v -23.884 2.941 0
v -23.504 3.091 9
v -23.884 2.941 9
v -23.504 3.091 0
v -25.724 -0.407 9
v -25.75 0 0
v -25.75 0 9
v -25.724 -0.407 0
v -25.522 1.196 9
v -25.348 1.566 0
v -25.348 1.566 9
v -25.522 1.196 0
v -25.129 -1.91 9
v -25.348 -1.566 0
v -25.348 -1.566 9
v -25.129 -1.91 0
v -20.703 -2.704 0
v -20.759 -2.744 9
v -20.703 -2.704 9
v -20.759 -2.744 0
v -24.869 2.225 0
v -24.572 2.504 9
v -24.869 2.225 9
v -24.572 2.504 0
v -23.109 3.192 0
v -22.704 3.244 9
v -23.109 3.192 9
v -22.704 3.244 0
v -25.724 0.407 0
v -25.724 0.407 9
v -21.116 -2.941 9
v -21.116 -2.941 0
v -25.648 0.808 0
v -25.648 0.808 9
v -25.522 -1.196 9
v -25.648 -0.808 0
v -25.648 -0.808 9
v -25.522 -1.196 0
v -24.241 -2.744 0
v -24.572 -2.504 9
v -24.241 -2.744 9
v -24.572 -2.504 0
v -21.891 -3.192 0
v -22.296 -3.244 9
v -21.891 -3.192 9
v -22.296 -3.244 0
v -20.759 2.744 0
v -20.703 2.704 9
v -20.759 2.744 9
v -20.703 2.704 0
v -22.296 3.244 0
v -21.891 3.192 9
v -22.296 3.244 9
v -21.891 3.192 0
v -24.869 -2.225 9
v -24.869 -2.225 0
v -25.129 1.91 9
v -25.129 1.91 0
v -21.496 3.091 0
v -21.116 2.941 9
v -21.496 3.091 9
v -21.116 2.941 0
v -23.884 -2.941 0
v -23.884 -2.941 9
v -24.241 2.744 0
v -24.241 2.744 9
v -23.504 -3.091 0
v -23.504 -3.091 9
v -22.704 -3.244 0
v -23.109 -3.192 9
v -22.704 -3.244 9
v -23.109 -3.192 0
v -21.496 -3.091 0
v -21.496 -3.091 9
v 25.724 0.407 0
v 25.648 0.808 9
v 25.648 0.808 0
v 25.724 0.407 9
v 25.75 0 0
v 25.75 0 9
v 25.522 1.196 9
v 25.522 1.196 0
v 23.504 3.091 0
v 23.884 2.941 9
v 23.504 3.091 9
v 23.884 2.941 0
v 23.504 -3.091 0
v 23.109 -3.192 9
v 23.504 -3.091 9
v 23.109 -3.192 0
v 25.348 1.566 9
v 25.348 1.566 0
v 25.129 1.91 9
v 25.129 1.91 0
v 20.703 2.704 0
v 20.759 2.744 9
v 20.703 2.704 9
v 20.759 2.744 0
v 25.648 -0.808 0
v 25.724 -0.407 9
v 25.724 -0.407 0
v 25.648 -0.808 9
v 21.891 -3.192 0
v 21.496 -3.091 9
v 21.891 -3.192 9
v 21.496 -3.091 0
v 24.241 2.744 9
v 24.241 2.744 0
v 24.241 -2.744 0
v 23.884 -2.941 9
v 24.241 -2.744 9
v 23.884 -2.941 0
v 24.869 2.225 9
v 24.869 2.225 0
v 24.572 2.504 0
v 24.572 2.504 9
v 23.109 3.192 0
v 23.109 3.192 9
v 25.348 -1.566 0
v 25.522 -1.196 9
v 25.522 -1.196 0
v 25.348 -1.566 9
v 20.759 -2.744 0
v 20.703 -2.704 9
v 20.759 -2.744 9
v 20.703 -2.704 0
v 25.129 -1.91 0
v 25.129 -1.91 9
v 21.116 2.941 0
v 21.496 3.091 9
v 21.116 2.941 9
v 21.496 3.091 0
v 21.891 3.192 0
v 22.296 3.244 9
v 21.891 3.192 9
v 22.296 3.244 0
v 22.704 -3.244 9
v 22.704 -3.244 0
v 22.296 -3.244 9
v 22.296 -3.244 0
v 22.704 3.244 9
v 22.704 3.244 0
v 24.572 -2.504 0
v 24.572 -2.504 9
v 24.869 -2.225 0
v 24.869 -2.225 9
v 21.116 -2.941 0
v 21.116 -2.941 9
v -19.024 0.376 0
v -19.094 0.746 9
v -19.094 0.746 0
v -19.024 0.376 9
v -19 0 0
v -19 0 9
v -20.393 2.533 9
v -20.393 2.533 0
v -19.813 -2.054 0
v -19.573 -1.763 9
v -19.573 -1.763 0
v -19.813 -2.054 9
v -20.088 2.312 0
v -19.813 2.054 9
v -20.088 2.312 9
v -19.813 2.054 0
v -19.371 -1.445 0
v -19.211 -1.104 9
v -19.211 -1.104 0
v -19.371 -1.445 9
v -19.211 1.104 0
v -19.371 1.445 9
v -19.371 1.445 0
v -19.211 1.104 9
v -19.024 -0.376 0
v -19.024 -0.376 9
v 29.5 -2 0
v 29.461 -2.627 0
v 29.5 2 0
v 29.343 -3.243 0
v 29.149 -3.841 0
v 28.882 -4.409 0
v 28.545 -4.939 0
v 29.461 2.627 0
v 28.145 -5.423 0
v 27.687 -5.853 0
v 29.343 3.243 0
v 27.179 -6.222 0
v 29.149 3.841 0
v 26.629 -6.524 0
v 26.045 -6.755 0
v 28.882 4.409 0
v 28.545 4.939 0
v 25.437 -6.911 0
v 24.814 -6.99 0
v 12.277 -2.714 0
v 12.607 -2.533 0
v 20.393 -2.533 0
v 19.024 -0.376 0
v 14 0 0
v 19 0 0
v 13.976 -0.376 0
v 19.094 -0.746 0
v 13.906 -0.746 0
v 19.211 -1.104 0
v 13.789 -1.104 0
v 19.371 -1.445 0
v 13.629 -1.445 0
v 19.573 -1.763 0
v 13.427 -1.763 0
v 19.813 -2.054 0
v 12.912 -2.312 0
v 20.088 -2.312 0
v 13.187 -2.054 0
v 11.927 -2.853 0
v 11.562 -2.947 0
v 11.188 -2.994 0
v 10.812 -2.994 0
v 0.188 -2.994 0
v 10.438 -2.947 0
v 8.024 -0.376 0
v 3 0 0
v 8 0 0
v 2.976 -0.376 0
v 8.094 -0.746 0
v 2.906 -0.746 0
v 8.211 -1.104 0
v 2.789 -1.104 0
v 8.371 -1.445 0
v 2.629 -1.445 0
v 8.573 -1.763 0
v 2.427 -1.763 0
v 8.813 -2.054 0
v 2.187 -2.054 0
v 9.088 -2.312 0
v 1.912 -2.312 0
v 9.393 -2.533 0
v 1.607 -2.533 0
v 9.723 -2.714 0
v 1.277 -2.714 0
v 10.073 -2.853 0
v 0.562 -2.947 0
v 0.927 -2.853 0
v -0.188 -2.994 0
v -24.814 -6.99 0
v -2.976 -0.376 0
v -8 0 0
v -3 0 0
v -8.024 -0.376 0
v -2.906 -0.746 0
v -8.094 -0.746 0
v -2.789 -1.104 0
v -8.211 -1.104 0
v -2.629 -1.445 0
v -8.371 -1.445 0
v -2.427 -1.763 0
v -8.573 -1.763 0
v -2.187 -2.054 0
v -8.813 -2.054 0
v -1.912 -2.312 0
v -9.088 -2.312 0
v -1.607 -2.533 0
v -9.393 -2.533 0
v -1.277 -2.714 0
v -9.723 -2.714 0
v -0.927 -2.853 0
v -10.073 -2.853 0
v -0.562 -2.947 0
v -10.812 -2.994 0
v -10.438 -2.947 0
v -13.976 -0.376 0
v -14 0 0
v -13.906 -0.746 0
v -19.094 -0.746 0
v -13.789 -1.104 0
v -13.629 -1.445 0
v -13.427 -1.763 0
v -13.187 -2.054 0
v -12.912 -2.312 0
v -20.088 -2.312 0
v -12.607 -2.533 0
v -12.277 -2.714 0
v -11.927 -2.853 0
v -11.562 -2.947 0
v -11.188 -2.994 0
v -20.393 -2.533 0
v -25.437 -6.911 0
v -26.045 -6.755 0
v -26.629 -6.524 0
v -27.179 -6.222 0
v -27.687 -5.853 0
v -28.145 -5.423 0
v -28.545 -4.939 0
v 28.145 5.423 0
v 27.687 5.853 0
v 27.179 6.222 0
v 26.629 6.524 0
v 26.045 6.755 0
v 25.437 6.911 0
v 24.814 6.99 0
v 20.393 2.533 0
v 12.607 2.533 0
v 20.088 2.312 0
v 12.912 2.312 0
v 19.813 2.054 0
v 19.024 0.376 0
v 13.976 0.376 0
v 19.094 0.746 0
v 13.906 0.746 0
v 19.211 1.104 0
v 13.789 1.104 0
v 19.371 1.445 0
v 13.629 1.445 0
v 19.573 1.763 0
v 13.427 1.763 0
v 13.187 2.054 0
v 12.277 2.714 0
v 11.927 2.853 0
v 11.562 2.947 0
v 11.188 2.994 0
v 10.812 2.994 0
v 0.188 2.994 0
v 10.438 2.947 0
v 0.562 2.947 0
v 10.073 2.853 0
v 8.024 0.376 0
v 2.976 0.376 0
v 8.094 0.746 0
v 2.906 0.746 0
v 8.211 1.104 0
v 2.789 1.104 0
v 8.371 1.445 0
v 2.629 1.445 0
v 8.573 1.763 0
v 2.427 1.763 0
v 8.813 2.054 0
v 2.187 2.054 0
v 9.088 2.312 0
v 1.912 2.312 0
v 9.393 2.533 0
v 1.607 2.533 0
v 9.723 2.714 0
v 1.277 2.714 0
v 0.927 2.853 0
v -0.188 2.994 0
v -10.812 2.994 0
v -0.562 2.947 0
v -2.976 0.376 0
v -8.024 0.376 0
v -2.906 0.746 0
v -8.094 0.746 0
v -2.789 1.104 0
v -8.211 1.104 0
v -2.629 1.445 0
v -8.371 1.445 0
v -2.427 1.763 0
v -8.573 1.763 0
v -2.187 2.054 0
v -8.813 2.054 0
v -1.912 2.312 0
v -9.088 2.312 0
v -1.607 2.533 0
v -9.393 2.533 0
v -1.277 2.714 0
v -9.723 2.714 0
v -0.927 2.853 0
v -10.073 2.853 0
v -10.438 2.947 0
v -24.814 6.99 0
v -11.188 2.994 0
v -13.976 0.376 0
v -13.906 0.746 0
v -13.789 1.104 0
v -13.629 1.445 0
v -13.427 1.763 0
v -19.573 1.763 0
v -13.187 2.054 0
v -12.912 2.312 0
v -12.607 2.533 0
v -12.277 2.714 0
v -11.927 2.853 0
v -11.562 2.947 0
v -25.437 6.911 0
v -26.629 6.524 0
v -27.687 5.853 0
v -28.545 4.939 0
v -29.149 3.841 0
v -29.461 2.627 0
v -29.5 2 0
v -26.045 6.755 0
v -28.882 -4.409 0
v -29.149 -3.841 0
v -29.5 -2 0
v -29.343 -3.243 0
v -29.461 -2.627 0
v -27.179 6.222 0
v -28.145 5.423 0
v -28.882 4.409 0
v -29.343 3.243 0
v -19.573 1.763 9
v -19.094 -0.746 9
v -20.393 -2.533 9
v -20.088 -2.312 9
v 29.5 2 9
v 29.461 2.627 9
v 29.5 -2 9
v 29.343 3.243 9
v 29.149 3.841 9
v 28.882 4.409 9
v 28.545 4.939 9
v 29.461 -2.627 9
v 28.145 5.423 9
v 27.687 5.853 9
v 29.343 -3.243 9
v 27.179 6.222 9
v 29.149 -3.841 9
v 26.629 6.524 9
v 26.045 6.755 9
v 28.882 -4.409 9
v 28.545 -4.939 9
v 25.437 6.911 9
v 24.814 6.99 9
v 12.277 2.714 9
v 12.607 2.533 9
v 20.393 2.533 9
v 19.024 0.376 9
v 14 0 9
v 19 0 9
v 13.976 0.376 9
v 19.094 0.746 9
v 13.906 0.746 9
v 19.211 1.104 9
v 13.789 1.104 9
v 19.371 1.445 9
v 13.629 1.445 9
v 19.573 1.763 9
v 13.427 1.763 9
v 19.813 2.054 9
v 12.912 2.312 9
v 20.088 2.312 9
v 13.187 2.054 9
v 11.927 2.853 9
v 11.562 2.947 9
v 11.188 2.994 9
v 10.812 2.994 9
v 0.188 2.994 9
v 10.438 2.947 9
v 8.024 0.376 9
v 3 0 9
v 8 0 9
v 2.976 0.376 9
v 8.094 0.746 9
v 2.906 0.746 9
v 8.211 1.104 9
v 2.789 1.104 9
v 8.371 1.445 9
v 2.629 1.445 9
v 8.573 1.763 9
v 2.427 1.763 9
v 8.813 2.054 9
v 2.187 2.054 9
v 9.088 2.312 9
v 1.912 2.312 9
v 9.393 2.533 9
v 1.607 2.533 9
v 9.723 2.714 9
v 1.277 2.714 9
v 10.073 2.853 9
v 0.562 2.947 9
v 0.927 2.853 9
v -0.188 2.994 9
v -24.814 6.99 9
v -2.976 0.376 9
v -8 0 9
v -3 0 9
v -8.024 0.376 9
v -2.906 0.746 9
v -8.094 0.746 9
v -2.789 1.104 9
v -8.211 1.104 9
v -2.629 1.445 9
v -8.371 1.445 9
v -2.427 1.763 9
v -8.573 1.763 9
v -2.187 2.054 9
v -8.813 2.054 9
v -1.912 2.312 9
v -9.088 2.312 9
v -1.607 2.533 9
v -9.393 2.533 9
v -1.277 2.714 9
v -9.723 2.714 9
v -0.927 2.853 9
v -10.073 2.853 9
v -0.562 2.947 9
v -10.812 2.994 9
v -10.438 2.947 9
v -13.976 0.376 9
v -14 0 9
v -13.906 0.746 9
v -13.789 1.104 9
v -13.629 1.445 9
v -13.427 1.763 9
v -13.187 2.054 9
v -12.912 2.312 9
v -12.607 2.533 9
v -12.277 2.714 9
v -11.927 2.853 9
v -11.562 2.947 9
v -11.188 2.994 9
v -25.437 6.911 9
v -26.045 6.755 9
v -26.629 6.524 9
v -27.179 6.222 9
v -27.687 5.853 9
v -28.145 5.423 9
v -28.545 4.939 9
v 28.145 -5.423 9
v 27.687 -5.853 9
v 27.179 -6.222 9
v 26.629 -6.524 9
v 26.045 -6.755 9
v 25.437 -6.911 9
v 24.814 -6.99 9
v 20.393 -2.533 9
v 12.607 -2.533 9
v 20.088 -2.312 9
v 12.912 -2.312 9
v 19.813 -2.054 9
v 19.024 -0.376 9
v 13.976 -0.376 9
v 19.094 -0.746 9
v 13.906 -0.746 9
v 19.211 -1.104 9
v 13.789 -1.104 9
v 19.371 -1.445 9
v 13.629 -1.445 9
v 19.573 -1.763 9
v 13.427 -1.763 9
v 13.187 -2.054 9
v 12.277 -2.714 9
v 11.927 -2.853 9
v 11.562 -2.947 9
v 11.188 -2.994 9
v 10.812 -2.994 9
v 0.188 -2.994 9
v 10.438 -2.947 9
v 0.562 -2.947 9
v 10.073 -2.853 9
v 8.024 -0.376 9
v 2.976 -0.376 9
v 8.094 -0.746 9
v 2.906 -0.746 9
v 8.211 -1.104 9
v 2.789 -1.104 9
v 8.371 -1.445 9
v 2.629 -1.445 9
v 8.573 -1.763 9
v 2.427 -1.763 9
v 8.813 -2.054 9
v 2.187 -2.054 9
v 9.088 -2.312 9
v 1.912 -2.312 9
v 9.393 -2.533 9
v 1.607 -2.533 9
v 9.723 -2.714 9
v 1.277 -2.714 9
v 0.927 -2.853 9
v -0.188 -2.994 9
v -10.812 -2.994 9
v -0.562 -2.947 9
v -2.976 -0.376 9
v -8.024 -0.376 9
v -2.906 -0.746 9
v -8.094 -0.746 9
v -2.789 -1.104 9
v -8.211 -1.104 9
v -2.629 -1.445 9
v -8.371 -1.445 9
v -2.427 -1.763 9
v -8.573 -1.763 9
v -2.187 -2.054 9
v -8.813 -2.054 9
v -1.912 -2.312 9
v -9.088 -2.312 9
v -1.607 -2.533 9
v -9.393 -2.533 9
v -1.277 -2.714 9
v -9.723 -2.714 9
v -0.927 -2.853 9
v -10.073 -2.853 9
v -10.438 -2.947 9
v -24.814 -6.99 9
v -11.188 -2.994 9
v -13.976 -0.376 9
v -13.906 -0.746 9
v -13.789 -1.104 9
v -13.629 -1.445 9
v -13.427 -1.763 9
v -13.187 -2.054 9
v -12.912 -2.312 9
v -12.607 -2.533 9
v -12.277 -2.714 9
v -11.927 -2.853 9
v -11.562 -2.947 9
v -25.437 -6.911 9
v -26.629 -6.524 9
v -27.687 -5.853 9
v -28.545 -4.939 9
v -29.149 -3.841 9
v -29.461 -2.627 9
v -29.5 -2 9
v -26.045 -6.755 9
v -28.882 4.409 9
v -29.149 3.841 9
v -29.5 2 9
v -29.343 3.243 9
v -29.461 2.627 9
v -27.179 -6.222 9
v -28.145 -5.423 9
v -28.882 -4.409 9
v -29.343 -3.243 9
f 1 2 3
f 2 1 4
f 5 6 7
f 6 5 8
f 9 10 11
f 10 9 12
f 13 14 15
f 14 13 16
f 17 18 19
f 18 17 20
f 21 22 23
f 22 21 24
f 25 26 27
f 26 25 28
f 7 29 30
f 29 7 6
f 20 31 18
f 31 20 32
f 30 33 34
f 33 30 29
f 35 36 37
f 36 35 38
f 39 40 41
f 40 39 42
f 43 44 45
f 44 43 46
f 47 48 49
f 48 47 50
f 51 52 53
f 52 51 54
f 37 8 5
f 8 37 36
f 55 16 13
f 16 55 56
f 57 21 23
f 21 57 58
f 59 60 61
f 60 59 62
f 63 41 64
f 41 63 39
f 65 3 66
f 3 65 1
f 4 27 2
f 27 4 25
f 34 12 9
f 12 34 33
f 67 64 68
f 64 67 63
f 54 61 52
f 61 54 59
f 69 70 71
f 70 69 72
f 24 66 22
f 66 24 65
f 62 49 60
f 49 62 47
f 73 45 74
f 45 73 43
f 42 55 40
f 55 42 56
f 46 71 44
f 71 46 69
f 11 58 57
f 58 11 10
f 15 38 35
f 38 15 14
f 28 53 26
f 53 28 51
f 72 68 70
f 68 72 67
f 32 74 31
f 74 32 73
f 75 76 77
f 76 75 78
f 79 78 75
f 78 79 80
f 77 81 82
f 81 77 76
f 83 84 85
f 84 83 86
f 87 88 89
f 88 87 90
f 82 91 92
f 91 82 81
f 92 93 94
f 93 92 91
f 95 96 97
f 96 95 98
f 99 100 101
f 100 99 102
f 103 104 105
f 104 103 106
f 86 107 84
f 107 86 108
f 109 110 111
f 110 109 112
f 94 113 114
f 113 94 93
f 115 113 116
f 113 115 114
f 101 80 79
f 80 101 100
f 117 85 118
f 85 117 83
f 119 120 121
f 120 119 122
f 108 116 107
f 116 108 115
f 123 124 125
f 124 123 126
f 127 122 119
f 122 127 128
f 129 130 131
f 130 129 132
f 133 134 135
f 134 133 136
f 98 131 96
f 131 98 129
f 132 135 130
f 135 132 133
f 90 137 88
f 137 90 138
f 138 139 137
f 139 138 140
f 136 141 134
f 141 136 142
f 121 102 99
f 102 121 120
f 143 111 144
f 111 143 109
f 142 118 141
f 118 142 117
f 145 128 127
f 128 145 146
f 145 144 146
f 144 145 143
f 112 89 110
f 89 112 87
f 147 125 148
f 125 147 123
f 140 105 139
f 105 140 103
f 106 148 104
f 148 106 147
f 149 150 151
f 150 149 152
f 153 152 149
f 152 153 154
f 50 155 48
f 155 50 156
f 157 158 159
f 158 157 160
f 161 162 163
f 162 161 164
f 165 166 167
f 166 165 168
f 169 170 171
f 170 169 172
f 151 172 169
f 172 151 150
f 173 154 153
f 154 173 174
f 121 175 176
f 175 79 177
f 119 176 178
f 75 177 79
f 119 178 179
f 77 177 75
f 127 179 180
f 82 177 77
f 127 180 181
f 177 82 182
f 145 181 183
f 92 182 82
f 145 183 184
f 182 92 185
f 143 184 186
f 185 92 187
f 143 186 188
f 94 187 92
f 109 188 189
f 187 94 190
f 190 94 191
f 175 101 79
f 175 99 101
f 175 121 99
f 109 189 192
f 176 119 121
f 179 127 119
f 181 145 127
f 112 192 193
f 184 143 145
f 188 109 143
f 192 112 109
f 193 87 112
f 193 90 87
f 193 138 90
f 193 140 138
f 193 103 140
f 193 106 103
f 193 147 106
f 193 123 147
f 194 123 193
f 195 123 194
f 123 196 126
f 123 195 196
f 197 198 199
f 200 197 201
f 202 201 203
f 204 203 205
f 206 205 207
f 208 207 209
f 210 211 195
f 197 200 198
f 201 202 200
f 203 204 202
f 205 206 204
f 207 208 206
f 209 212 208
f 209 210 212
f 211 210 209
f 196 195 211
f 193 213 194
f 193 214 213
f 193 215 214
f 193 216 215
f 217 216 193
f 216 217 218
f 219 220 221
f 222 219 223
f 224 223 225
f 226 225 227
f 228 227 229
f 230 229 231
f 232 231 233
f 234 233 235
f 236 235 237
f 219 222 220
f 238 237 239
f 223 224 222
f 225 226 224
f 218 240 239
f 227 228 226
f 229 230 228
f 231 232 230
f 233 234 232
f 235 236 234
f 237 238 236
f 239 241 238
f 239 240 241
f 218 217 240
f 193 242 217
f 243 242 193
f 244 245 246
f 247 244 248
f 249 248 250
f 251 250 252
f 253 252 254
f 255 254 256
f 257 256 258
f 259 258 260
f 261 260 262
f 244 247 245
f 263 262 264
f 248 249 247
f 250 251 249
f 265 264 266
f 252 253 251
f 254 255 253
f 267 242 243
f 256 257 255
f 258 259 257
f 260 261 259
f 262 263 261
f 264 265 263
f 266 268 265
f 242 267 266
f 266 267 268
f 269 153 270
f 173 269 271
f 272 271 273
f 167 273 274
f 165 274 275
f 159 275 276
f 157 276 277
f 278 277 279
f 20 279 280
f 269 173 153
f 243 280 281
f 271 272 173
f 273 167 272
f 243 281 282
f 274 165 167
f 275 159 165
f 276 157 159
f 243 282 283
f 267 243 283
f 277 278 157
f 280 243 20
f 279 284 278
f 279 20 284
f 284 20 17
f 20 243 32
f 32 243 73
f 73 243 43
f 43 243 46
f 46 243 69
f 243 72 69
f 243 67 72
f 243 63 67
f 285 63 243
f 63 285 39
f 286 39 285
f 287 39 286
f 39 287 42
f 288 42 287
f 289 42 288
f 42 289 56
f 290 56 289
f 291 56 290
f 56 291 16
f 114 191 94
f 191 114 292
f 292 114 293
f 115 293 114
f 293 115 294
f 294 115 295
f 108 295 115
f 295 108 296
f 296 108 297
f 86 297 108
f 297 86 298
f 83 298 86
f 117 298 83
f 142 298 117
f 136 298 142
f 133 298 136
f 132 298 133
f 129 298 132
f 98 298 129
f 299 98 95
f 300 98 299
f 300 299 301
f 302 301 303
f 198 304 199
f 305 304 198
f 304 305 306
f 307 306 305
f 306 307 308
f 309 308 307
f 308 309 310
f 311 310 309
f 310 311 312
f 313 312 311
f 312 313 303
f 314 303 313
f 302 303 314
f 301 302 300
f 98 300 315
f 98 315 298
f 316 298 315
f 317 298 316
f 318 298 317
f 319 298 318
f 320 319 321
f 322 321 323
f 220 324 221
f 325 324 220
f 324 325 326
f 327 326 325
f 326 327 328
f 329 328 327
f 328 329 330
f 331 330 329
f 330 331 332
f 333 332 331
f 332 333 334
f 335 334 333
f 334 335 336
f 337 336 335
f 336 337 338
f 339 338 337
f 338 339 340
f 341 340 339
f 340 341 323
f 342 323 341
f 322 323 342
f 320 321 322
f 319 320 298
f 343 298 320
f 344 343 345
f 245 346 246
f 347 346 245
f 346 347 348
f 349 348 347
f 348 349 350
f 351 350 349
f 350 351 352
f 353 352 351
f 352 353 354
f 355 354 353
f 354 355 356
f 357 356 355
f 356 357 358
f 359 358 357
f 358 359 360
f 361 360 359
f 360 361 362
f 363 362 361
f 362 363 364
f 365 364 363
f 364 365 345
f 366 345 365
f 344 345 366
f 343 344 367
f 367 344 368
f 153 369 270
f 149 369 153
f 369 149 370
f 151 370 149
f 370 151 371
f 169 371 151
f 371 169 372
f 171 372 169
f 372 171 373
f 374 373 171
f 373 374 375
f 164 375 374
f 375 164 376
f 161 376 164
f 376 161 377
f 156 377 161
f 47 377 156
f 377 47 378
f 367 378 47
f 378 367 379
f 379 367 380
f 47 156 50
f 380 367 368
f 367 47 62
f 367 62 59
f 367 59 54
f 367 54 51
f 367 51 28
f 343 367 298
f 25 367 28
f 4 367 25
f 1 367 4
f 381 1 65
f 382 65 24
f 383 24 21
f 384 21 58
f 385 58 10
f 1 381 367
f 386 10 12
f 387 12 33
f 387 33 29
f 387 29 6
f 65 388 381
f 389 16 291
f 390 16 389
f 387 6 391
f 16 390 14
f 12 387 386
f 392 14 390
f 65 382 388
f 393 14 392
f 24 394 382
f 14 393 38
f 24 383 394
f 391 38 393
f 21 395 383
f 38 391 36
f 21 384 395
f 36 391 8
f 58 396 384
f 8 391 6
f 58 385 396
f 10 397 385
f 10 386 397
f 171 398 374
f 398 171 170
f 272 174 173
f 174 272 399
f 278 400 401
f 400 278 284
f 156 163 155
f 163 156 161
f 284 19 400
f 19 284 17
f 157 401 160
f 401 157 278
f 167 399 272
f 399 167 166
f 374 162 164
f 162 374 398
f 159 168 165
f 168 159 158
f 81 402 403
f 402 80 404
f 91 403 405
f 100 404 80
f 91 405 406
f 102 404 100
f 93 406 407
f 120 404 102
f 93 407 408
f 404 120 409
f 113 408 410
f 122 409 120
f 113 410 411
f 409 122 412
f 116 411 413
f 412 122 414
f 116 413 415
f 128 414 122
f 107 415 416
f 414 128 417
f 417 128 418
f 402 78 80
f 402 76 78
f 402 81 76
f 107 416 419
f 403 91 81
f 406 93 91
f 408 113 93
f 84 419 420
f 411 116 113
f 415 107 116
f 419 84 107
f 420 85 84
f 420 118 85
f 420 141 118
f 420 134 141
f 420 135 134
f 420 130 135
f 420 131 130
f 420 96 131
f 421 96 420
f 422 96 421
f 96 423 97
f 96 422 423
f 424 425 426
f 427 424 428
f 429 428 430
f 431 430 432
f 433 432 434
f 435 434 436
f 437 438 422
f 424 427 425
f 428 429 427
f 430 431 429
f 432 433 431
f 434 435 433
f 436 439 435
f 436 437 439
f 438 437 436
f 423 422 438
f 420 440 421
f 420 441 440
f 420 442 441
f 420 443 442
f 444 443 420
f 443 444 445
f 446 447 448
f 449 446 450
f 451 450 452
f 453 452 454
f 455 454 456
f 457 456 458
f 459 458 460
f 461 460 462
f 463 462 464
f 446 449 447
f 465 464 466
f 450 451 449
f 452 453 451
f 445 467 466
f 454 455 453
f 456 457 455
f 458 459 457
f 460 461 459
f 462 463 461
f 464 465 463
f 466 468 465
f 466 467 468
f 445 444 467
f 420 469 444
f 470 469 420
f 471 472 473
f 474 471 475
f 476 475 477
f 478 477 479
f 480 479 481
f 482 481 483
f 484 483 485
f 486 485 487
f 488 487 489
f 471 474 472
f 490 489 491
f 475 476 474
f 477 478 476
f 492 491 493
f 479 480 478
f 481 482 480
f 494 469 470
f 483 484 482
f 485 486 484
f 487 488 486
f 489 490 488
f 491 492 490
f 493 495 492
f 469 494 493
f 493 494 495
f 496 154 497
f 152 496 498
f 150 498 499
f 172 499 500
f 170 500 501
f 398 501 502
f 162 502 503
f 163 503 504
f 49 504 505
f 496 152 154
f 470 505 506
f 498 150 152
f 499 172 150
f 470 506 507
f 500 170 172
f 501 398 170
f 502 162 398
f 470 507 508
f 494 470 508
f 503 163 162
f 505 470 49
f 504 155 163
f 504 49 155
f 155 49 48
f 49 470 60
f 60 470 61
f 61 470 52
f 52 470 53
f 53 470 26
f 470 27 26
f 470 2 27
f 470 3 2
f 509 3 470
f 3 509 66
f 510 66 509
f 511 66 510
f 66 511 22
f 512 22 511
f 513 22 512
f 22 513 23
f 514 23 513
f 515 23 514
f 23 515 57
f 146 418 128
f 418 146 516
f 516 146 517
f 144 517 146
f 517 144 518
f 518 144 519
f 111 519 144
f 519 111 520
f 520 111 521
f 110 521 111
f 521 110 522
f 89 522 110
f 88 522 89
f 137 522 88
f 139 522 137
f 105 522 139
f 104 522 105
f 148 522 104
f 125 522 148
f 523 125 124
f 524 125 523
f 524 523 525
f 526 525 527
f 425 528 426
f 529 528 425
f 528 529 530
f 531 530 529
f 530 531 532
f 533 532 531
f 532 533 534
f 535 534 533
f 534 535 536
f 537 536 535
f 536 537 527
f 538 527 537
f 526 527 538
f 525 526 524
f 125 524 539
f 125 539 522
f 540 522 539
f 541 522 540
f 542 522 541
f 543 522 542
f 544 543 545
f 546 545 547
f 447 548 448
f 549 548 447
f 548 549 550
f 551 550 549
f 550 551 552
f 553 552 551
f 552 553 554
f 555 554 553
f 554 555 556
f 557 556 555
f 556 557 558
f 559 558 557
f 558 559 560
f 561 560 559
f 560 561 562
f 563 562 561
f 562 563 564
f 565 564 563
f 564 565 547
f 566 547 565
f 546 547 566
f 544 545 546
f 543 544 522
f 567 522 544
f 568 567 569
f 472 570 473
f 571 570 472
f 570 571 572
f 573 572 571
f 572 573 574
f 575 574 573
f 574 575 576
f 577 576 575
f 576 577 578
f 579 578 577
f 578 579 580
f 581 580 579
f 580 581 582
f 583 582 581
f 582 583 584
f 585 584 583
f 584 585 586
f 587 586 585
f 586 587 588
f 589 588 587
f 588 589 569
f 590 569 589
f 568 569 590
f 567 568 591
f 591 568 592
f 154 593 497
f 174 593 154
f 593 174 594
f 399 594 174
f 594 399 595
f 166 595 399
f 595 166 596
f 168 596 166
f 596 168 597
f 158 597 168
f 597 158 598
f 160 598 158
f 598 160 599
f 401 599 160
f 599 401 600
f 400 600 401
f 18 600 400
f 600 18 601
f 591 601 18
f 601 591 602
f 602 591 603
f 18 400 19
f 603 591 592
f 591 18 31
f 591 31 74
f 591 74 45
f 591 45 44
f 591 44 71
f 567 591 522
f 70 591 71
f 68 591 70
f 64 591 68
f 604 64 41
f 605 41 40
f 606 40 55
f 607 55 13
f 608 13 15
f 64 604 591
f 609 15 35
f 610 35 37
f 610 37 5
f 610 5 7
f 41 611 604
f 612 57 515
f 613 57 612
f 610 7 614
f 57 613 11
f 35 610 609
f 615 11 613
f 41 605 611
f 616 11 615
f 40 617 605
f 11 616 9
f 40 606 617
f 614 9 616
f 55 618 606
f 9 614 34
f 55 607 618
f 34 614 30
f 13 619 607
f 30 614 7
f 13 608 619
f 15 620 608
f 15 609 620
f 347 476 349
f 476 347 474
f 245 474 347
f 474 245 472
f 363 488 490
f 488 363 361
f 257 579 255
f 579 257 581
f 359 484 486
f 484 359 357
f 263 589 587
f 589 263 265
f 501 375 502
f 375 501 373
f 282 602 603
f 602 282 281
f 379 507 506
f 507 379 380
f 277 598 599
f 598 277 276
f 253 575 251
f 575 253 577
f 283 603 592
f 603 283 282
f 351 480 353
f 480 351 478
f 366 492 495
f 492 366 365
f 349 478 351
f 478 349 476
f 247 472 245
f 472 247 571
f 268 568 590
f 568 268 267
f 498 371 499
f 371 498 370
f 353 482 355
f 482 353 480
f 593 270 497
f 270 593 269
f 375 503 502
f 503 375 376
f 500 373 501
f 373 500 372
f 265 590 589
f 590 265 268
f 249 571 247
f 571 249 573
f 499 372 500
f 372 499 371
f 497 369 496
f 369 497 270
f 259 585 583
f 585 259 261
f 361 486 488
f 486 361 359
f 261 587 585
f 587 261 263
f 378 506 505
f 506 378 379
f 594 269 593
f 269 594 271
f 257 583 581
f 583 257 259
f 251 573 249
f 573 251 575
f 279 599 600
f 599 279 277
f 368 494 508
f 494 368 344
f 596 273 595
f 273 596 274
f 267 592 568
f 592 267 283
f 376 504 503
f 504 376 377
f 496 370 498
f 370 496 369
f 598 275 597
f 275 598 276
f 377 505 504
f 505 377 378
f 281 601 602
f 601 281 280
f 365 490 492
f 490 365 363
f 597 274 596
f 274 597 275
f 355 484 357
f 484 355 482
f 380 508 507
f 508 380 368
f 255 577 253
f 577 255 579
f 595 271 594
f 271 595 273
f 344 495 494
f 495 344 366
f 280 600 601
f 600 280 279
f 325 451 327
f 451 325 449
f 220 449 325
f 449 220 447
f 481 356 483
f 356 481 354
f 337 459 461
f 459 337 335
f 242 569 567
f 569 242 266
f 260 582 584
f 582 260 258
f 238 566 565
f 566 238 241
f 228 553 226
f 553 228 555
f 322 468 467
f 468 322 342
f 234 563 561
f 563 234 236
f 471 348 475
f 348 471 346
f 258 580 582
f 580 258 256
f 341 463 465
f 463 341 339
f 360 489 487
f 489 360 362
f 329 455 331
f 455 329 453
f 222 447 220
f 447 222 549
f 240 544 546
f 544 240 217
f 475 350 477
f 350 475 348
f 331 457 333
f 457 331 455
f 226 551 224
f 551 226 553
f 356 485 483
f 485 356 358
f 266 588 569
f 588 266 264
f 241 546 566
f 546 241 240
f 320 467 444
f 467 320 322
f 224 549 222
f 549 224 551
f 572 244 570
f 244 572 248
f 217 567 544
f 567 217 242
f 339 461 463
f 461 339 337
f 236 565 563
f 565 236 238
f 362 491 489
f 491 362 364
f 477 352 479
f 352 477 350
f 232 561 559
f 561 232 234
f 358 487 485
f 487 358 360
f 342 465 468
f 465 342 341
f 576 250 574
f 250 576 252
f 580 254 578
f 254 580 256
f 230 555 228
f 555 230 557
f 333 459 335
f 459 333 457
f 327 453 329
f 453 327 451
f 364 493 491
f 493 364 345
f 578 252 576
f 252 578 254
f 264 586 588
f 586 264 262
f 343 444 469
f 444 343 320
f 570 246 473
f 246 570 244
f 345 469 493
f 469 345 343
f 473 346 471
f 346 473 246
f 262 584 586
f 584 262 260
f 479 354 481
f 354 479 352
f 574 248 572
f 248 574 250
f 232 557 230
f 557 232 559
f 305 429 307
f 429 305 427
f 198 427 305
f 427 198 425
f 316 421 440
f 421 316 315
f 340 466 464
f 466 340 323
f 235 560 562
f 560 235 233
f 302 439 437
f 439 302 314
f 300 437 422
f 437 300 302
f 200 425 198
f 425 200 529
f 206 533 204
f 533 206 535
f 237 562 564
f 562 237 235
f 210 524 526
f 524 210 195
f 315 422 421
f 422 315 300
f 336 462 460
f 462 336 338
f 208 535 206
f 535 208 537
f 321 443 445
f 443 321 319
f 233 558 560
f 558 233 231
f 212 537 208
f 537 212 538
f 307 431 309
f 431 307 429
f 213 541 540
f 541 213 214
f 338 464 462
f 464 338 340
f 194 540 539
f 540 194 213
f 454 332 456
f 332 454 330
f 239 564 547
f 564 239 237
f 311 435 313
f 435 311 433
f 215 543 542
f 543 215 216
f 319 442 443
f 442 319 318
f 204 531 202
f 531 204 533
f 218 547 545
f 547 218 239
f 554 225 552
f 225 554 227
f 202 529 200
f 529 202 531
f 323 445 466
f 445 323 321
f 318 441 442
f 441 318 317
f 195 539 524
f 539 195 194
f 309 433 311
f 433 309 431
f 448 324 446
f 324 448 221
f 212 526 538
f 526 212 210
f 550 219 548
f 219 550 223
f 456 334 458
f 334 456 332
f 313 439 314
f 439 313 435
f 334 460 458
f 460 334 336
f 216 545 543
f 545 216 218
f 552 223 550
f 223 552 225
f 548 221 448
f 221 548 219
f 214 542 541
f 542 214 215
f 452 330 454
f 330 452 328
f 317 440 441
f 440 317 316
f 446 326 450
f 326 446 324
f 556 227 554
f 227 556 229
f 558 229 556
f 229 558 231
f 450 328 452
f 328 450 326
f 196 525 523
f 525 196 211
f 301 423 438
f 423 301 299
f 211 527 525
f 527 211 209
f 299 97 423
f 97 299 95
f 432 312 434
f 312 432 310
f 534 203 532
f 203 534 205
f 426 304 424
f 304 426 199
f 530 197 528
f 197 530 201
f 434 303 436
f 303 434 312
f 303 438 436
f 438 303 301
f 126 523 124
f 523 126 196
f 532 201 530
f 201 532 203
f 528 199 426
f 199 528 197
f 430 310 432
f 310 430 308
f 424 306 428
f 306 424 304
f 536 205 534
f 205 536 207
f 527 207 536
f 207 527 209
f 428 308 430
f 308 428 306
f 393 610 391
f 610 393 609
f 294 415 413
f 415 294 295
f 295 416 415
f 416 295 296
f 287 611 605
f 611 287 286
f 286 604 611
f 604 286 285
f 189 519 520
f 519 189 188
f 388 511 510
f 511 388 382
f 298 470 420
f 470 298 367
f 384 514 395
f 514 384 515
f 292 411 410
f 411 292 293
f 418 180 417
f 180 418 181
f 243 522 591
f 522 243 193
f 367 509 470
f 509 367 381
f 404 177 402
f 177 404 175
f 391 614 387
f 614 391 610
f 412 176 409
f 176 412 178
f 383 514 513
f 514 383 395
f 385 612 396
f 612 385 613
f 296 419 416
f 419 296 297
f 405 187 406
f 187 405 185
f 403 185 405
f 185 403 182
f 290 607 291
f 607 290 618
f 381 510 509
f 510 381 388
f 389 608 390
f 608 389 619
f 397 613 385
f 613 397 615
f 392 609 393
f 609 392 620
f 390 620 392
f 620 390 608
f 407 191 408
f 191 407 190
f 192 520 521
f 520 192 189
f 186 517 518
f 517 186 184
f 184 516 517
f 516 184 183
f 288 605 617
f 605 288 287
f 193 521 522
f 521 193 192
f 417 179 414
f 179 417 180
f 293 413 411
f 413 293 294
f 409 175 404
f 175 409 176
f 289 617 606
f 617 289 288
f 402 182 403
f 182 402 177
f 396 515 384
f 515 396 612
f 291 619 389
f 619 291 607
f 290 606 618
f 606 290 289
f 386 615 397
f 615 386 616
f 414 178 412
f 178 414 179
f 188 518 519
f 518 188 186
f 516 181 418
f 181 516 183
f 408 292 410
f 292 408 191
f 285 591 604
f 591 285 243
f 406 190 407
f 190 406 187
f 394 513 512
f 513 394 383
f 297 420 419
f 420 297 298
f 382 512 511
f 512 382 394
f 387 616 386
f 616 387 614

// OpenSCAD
$fn = 50;


difference() {
	union() {
		hull() {
			translate(v = [-24.5000000000, 2.0000000000, 0]) {
				cylinder(h = 9, r = 5);
			}
			translate(v = [24.5000000000, 2.0000000000, 0]) {
				cylinder(h = 9, r = 5);
			}
			translate(v = [-24.5000000000, -2.0000000000, 0]) {
				cylinder(h = 9, r = 5);
			}
			translate(v = [24.5000000000, -2.0000000000, 0]) {
				cylinder(h = 9, r = 5);
			}
		}
	}
	union() {
		#translate(v = [-22.5000000000, 0.0000000000, -100.0000000000]) {
			cylinder(h = 200, r = 3.2500000000);
		}
		#translate(v = [-22.5000000000, 0.0000000000, -100.0000000000]) {
			cylinder(h = 200, r = 3.2500000000);
		}
		#translate(v = [22.5000000000, 0.0000000000, -100.0000000000]) {
			cylinder(h = 200, r = 3.2500000000);
		}
		#translate(v = [22.5000000000, 0.0000000000, -100.0000000000]) {
			cylinder(h = 200, r = 3.2500000000);
		}
		#translate(v = [-22.0000000000, 0, 0]) {
			cylinder(h = 9, r = 3.0000000000);
		}
		#translate(v = [-11.0000000000, 0, 0]) {
			cylinder(h = 9, r = 3.0000000000);
		}
		#cylinder(h = 9, r = 3.0000000000);
		#translate(v = [11.0000000000, 0, 0]) {
			cylinder(h = 9, r = 3.0000000000);
		}
		#translate(v = [22.0000000000, 0, 0]) {
			cylinder(h = 9, r = 3.0000000000);
		}
	}
}
